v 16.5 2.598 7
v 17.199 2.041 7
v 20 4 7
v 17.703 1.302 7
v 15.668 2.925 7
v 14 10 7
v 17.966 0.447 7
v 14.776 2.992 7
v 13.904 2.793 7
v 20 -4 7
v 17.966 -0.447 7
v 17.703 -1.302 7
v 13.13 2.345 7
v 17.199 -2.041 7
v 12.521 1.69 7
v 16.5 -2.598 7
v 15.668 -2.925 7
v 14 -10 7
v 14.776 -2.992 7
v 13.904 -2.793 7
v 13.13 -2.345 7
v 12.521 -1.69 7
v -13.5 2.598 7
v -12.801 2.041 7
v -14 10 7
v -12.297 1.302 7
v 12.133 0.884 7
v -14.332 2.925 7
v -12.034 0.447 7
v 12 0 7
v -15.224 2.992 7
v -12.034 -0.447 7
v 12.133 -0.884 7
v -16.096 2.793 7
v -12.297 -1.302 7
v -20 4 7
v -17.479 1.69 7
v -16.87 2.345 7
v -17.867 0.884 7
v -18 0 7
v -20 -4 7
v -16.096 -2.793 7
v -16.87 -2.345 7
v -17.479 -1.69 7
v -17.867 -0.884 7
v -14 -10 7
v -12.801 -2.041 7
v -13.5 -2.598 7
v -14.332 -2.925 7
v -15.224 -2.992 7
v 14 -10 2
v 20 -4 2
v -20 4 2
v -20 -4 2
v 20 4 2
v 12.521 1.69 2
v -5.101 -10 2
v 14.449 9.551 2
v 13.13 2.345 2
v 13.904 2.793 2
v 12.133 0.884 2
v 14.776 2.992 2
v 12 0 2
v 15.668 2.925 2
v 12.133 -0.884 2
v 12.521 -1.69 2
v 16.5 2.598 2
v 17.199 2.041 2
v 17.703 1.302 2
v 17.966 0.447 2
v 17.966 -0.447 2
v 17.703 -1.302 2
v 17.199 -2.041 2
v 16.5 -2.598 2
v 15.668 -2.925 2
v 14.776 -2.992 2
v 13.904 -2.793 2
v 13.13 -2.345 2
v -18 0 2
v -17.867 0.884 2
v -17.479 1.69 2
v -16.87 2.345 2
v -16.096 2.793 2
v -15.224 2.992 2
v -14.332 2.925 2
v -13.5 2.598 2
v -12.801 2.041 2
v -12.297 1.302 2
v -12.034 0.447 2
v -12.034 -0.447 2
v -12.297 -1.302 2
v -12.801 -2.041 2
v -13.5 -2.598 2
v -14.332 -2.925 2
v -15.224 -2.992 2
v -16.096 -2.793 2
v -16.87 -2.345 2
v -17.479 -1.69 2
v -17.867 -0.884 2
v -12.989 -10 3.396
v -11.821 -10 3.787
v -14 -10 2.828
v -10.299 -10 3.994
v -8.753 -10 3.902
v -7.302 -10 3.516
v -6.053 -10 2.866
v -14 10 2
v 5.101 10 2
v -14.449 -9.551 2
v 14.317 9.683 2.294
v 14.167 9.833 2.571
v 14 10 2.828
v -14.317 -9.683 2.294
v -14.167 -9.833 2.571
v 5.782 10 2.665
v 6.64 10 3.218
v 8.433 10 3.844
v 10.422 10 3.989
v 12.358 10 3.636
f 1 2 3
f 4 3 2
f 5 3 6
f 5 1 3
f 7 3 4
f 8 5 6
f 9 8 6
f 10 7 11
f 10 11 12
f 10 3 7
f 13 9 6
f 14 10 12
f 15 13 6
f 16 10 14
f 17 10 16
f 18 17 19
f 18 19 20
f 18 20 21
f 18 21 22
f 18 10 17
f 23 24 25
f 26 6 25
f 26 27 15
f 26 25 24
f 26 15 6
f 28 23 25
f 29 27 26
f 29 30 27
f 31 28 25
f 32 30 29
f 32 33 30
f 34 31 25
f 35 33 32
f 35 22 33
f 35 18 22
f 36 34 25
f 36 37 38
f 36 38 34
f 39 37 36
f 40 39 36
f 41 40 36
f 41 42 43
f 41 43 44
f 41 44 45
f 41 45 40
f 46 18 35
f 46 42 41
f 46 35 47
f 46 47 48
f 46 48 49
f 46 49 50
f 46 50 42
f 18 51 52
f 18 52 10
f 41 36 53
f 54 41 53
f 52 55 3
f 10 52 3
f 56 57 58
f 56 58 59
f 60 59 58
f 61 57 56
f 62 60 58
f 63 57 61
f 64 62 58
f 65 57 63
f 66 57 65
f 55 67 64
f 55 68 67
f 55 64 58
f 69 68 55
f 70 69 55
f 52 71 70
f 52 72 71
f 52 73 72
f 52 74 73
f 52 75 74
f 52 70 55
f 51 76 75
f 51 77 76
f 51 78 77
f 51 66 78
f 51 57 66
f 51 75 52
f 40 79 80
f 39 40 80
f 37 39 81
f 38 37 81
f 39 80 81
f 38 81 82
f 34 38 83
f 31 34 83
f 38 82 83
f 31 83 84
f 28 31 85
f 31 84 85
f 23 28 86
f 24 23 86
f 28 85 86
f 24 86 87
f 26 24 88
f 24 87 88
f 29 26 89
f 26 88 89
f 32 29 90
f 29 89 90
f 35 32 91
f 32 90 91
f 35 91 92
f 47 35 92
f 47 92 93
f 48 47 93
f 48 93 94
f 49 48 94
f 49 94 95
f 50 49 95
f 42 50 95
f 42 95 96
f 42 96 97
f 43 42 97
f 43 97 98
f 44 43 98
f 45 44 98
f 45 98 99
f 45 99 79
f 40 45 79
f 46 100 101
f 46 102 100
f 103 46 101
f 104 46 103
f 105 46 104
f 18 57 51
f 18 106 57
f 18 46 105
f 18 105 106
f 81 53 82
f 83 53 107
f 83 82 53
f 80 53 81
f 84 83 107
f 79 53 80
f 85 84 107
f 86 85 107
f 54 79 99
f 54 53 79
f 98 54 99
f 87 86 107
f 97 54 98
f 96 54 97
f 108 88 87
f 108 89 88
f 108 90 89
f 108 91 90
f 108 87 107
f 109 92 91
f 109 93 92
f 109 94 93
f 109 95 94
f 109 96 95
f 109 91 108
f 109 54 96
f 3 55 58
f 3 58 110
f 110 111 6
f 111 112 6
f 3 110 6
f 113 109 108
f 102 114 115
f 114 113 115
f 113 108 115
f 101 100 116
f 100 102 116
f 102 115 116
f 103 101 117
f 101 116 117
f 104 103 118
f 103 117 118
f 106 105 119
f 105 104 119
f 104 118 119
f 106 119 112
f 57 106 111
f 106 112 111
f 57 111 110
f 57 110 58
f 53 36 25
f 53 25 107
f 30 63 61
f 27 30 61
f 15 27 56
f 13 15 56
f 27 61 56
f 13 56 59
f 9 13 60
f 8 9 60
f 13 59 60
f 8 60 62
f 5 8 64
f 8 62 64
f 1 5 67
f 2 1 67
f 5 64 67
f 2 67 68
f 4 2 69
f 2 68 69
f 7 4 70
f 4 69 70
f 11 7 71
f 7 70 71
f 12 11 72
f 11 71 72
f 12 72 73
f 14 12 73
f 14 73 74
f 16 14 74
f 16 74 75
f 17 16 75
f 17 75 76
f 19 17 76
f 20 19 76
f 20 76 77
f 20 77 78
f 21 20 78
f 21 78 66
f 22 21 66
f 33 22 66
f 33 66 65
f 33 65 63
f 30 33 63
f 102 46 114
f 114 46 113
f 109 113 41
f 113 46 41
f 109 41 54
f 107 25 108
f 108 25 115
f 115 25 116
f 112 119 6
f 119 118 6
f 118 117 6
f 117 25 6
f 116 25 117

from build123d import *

# Parameters (mm, degrees)
F1_DEPTH = 10
F3_D     = 6
F5_R     = 4
F6_DEPTH = 30
F7_SIZE  = 6


with BuildPart() as f1:
    # F0 (on Front) → F1 (new body, symmetric)
    with BuildSketch(Plane.XZ):
        with BuildLine():
            ThreePointArc((-3.4641016151, 2), (0, 4), (3.4641016151, 2))
            Line((3.4641016151, 2), (20, 2))
            Line((20, 2), (20, 7))
            Line((20, 7), (-20, 7))
            Line((-20, 7), (-20, 2))
            Line((-20, 2), (-3.4641016151, 2))
        make_face()
        with BuildLine():
            Line((-3.4641016151, 2), (3.4641016151, 2))
            ThreePointArc((3.4641016151, 2), (0, 4), (-3.4641016151, 2))
        make_face()
    extrude(amount=F1_DEPTH, both=True)

    # F3 (through all)
    with Locations(Plane.XY.offset(7)):
        with Locations((15, 0), (-15, 0)):
            Hole(F3_D / 2)

    # F5 (on face) → F6 (cut, symmetric)
    with BuildSketch(Plane(origin=(0, 0, 0), x_dir=(-0.7071067812, 0.7071067812, 0), z_dir=(0.7071067812, 0.7071067812, 0))):
        Circle(F5_R)
    extrude(amount=F6_DEPTH, both=True, mode=Mode.SUBTRACT)

    # F7
    f7_edges = [f1.edges().sort_by_distance(p)[0] for p in [
        (-20, -10, 4.5),
        (20, 10, 4.5),
        (20, -10, 4.5),
        (-20, 10, 4.5),
    ]]
    chamfer(f7_edges, length=F7_SIZE)


solid = f1.part
